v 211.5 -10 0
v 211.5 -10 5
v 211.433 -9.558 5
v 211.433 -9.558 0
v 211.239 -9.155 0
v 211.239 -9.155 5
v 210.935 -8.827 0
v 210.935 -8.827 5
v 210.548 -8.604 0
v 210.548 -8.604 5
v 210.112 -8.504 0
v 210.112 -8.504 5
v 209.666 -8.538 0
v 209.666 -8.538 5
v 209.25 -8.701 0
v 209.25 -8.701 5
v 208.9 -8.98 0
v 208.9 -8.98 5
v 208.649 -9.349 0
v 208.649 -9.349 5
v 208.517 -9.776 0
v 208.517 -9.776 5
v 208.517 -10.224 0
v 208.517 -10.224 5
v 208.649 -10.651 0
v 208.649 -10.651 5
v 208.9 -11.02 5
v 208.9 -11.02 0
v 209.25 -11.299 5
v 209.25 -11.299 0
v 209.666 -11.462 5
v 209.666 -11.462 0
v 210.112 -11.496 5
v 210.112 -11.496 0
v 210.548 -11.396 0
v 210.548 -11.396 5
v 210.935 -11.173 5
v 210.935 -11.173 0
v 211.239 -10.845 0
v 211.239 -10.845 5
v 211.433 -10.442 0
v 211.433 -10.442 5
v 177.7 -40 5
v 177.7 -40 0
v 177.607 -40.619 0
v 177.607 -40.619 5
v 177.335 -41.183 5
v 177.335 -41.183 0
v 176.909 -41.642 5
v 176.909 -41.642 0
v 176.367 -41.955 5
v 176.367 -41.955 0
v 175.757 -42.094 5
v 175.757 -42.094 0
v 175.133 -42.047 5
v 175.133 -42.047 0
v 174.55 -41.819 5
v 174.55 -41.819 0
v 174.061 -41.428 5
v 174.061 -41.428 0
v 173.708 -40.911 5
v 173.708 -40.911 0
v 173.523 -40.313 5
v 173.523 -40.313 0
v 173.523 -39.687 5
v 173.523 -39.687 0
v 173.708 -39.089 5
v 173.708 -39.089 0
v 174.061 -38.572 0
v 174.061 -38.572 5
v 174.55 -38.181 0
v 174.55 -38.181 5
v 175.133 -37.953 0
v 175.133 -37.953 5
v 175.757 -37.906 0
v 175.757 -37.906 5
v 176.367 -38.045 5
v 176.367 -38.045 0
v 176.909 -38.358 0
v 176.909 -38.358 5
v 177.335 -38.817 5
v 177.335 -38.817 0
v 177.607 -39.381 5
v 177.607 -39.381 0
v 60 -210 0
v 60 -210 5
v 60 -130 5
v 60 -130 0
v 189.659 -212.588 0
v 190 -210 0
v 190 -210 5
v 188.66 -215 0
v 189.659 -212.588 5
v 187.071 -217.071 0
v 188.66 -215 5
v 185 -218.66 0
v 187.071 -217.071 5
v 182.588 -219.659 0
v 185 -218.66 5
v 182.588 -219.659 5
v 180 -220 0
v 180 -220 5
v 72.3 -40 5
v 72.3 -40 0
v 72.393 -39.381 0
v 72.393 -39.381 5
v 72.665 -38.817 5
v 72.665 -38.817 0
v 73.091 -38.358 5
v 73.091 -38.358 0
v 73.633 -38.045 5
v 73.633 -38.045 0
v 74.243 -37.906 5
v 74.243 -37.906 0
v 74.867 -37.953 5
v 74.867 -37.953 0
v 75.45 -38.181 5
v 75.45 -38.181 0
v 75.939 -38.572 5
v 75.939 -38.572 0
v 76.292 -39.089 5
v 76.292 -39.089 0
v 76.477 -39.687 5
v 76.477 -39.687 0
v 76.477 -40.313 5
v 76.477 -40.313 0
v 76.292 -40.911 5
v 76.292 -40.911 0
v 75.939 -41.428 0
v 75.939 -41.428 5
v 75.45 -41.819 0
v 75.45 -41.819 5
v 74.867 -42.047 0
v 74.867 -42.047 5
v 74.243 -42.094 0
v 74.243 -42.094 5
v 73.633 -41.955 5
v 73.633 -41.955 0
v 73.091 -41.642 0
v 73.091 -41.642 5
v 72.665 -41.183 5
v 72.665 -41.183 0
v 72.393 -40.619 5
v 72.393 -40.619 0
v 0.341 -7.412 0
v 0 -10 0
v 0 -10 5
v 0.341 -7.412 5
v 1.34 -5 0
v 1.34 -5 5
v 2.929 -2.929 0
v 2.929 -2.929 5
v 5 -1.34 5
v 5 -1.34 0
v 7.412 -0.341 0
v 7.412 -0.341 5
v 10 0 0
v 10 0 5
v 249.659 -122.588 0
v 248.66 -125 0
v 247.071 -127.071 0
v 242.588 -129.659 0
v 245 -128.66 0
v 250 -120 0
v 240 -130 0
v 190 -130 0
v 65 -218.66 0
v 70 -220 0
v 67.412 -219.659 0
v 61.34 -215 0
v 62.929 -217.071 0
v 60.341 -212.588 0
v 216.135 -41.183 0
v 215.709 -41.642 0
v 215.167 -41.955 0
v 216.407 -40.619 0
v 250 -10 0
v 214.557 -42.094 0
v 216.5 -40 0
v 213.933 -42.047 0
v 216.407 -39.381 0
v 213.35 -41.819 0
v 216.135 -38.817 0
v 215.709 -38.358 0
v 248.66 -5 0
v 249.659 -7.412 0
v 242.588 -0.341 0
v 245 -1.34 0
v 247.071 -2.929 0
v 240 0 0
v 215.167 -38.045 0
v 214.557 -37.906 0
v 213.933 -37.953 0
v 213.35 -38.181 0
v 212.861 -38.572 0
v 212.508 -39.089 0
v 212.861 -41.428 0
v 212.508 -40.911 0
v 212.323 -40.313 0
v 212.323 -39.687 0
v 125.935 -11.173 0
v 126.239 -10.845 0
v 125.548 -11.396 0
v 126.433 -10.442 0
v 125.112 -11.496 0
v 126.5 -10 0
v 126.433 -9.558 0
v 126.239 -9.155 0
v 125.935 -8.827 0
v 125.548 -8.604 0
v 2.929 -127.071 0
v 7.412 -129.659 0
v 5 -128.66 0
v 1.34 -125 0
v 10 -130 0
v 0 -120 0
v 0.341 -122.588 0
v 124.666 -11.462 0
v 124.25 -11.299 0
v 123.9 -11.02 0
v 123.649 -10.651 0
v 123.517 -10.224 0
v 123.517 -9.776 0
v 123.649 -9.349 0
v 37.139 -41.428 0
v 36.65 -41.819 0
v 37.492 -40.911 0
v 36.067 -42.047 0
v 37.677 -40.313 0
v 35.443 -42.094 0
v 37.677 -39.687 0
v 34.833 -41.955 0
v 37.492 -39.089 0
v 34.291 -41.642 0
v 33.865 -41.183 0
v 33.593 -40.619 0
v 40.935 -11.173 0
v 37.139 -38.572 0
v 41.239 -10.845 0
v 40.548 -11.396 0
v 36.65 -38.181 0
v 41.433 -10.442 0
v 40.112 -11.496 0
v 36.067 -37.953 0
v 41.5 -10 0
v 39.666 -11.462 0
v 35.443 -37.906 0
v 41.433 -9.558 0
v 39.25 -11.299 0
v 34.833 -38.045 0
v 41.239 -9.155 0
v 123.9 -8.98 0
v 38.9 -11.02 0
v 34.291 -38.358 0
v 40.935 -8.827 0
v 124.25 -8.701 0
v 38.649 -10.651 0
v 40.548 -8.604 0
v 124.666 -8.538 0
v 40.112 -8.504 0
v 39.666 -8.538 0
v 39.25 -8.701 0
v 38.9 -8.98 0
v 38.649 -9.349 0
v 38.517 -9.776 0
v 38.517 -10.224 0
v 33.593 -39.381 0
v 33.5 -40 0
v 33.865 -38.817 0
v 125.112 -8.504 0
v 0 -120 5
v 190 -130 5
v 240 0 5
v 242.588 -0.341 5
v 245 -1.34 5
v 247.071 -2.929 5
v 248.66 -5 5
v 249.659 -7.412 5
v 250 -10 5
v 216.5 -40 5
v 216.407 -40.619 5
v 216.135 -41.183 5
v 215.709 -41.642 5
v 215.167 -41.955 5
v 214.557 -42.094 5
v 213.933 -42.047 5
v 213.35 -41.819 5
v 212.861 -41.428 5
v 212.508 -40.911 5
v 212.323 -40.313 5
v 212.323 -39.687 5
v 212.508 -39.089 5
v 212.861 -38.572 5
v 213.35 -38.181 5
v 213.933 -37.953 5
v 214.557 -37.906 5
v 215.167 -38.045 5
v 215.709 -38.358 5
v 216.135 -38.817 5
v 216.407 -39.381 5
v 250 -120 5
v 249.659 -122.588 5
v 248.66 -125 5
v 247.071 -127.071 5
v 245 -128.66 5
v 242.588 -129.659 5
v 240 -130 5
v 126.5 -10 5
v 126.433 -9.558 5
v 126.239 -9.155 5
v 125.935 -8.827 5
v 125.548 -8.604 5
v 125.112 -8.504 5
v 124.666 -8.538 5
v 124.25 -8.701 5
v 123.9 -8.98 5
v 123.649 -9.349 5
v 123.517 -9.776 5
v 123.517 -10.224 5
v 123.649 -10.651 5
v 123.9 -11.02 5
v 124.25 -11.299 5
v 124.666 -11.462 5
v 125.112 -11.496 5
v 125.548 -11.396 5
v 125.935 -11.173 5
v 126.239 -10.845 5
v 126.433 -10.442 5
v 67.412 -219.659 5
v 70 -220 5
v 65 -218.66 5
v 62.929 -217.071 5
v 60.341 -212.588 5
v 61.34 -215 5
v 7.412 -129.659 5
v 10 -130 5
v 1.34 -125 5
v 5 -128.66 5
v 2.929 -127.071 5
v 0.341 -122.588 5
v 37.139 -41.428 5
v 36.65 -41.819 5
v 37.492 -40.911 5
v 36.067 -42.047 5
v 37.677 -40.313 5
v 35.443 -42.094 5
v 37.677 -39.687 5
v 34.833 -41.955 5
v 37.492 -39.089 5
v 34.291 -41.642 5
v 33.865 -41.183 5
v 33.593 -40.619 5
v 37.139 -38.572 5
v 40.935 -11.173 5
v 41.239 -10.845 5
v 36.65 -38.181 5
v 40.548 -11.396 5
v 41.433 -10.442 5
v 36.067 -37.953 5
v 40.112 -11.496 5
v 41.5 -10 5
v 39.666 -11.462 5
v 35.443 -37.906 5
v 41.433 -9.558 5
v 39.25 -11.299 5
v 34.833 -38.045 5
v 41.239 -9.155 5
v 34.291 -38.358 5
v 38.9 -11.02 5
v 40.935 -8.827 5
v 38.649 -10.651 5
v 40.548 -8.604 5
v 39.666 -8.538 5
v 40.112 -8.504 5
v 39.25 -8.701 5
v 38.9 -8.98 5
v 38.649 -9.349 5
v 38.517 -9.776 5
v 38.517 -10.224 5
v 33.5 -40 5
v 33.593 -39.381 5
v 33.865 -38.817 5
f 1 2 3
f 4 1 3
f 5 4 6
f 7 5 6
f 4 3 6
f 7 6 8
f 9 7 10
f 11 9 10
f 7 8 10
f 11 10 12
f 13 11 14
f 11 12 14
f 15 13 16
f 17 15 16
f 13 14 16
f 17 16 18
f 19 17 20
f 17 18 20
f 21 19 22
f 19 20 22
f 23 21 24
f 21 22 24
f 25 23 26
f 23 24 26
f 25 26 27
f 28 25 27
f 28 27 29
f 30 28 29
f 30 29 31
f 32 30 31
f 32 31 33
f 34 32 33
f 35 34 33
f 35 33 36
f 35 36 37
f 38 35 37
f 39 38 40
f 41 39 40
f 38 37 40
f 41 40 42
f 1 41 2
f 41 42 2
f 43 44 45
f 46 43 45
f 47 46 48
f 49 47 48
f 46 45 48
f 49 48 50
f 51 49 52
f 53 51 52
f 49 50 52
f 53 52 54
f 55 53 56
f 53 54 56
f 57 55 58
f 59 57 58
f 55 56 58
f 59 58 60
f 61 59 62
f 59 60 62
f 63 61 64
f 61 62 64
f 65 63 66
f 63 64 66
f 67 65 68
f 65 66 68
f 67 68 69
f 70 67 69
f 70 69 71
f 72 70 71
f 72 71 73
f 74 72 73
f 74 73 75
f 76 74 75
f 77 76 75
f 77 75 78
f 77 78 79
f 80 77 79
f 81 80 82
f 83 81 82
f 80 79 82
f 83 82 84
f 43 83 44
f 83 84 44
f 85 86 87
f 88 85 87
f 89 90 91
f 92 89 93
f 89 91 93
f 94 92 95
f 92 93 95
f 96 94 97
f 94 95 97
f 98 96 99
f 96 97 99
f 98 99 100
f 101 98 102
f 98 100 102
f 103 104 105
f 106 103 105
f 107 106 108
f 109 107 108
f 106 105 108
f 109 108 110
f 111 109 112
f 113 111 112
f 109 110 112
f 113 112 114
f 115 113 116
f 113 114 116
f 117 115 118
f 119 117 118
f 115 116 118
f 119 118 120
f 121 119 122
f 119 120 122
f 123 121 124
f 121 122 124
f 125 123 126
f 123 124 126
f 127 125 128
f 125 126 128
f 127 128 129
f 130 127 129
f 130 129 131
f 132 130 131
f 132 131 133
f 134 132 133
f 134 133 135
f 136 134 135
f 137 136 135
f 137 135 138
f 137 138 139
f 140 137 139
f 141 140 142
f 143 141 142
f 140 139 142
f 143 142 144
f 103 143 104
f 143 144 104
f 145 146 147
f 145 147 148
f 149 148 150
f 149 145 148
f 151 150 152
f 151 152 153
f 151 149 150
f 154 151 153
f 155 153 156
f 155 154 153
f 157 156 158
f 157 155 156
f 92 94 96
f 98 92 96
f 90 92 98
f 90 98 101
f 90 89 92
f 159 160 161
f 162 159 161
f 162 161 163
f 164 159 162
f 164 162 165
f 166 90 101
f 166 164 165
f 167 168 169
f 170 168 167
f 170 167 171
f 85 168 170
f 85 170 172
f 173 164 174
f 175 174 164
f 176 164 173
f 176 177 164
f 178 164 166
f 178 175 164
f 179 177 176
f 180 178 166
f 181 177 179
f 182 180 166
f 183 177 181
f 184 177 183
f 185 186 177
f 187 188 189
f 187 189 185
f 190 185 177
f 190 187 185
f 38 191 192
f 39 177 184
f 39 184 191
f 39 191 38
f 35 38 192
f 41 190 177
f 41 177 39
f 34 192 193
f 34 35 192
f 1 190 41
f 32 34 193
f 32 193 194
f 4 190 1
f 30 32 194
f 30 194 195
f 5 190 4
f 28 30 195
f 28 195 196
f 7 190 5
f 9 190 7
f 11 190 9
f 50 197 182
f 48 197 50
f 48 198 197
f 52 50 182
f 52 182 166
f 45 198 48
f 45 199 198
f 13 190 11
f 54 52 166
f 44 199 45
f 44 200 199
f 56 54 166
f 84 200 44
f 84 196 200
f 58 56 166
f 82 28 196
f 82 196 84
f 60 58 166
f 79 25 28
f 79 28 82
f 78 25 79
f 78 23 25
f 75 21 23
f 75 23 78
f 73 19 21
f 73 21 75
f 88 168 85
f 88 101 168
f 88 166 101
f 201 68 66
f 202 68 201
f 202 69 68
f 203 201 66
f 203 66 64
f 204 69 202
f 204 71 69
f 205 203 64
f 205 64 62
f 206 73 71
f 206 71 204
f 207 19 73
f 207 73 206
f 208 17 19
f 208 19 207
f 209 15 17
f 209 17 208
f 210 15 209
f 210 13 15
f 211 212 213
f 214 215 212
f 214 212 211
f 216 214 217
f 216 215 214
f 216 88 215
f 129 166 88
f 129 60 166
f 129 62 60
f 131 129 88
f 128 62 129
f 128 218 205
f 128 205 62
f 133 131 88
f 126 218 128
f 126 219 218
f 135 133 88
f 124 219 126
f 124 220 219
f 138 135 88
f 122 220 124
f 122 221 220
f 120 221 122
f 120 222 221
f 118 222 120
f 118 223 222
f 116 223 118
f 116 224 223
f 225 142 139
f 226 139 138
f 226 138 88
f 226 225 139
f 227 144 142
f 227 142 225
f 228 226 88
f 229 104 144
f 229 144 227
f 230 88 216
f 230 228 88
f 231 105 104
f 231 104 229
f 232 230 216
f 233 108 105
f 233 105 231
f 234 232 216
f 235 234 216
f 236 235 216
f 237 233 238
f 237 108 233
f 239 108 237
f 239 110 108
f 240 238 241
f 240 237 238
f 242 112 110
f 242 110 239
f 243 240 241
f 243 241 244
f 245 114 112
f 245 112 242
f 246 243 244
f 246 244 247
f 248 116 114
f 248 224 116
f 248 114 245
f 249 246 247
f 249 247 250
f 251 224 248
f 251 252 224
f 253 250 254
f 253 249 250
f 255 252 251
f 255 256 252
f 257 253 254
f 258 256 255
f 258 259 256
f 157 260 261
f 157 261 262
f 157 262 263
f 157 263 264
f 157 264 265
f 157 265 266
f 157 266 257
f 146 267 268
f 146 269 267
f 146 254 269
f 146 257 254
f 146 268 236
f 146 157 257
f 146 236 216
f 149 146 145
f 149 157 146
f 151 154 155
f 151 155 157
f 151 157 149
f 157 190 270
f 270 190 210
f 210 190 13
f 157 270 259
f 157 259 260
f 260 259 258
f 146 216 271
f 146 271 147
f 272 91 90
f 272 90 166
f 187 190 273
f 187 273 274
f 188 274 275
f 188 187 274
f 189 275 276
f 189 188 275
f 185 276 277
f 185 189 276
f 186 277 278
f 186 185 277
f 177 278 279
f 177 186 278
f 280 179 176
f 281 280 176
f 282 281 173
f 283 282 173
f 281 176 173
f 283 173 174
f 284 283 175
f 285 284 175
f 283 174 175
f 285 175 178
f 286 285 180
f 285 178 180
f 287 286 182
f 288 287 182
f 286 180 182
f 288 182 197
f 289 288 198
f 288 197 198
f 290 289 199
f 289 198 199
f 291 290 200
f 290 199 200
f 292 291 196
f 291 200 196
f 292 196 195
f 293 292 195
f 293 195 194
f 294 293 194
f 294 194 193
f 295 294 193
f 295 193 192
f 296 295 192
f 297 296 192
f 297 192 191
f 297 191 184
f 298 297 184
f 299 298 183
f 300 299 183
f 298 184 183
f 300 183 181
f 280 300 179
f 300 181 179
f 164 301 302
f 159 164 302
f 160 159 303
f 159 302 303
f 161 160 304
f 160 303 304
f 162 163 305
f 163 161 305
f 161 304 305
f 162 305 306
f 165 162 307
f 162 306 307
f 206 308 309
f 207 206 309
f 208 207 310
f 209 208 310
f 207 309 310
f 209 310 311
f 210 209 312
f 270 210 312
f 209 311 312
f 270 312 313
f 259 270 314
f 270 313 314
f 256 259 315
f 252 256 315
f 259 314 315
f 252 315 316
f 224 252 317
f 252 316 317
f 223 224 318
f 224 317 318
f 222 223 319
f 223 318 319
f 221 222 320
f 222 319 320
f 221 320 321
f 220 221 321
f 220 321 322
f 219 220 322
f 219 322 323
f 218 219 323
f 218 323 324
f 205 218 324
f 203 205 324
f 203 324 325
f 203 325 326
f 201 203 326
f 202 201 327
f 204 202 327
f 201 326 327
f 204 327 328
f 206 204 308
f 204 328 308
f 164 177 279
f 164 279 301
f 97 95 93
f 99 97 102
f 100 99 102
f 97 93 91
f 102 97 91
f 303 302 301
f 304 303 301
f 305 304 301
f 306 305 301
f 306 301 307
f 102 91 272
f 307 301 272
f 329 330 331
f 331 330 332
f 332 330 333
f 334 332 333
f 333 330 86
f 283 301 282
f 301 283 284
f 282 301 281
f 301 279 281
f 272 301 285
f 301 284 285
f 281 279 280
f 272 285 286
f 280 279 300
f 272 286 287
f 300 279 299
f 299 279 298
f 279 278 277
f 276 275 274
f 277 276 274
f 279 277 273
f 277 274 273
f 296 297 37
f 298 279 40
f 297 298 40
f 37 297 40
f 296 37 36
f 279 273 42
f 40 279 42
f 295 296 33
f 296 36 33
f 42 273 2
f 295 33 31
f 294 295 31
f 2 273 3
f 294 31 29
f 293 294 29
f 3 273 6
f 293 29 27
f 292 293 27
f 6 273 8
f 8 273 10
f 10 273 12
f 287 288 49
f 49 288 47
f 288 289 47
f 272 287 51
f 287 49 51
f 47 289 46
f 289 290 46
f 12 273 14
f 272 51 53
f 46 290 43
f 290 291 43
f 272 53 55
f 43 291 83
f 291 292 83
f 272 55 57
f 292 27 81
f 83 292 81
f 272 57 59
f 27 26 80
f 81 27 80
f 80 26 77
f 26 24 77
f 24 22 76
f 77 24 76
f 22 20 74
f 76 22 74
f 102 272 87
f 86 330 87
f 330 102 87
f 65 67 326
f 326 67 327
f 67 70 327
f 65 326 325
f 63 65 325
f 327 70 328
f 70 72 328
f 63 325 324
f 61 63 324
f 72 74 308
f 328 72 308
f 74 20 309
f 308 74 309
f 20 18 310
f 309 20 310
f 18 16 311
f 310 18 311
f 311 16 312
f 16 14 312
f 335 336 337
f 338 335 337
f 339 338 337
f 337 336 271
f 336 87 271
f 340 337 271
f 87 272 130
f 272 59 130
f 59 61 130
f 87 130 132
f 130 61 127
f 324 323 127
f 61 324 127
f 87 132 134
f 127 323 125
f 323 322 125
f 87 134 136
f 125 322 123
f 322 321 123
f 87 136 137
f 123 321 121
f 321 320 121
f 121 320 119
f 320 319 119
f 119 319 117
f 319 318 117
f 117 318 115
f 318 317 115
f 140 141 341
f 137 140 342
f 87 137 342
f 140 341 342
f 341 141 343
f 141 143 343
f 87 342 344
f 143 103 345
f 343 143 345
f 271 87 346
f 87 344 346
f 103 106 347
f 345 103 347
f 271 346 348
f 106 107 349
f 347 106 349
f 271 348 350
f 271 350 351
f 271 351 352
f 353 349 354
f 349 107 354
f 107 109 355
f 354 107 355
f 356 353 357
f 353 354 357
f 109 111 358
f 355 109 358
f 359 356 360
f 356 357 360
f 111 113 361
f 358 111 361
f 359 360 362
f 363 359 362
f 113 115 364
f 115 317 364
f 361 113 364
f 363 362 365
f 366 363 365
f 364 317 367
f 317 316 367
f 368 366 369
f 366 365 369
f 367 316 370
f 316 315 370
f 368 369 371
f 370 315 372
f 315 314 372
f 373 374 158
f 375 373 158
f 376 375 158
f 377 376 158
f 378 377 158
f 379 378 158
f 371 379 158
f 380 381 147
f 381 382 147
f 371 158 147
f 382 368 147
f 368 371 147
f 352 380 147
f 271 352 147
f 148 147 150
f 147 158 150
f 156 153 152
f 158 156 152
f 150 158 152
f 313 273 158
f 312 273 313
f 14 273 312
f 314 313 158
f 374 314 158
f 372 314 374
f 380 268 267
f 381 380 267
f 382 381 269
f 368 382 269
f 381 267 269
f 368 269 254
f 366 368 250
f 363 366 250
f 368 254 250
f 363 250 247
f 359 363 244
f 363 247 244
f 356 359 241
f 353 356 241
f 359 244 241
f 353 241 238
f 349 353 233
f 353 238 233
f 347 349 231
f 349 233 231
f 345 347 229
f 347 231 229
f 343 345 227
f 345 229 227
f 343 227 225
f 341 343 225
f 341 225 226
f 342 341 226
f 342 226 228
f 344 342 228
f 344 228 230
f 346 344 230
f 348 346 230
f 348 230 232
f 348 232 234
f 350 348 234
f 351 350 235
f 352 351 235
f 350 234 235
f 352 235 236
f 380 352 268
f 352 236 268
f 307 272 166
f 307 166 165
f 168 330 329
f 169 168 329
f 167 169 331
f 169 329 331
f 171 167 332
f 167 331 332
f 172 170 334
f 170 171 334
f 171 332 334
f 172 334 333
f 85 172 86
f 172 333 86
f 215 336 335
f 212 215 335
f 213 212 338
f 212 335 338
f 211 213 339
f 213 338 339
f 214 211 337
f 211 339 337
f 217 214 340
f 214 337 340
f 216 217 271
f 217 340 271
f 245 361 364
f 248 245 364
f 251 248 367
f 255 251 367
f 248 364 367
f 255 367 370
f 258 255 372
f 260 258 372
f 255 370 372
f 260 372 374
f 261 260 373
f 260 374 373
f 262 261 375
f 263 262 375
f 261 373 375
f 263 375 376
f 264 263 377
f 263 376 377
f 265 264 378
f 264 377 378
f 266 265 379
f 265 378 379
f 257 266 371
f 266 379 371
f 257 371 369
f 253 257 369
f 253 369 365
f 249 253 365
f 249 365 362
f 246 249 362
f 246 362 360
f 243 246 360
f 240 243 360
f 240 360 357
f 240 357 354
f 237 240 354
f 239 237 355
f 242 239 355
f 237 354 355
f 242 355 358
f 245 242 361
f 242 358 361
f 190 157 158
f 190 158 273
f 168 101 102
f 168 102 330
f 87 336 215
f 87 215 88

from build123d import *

# Parameters (mm, degrees)
EXTRUDE_1_DEPTH      = 5
SKETCH_9_R           = 1.5
CUT_EXTRUDE_7_DEPTH  = 5
SKETCH_7_R           = 2.1
CUT_EXTRUDE_8_DEPTH  = 5
CUT_EXTRUDE_9_REACH  = 335.054
SKETCH_10_W          = 60
SKETCH_10_H          = 90
CUT_EXTRUDE_11_REACH = 335.054


with BuildPart() as part:
    # 草图1 → 凸台-拉伸1 (new body)
    with BuildSketch(Plane.XY):
        with BuildLine():
            Line((10, 0), (240, 0))
            ThreePointArc((240, 0), (247.071067812, -2.928932188), (250, -10))
            Line((250, -10), (250, -210))
            ThreePointArc((250, -210), (247.071067812, -217.071067812), (240, -220))
            Line((240, -220), (10, -220))
            ThreePointArc((10, -220), (2.928932188, -217.071067812), (0, -210))
            Line((0, -210), (0, -10))
            ThreePointArc((0, -10), (2.928932188, -2.928932188), (10, 0))
        make_face()
    extrude(amount=EXTRUDE_1_DEPTH)

    # 草图9 → 切除-拉伸7 (cut)
    with BuildSketch(Plane.XY.offset(5)):
        with Locations((40, -10)):
            Circle(SKETCH_9_R)
        with Locations((125, -10)):
            Circle(SKETCH_9_R)
        with Locations((210, -10)):
            Circle(SKETCH_9_R)
    extrude(amount=-CUT_EXTRUDE_7_DEPTH, mode=Mode.SUBTRACT)

    # 草图7 → 切除-拉伸8 (cut)
    with BuildSketch(Plane(origin=(0, 0, 0), x_dir=(-1, 0, 0), z_dir=(0, 0, -1))):
        with Locations((-74.4, -40)):
            Circle(SKETCH_7_R)
        with Locations((-35.6, -40)):
            Circle(SKETCH_7_R)
        with Locations(Location((-214.4, -40, 0), (0, 0, 180))):
            Circle(SKETCH_7_R)
        with Locations(Location((-175.6, -40, 0), (0, 0, 180))):
            Circle(SKETCH_7_R)
    extrude(amount=-CUT_EXTRUDE_8_DEPTH, mode=Mode.SUBTRACT)

    # 草图10 → 切除-拉伸9 (cut, up to next)
    with BuildSketch(Plane.XY.offset(5), mode=Mode.PRIVATE) as cut_extrude_9_sk1:
        with Locations((220, -175)):
            Rectangle(SKETCH_10_W, SKETCH_10_H)
    cut_extrude_9_tool1 = extrude(cut_extrude_9_sk1.sketch, amount=-CUT_EXTRUDE_9_REACH, mode=Mode.PRIVATE) & part.part
    # 草图10 → 切除-拉伸9 (cut, up to next)
    with BuildSketch(Plane.XY.offset(5), mode=Mode.PRIVATE) as cut_extrude_9_sk2:
        with Locations((30, -175)):
            Rectangle(SKETCH_10_W, SKETCH_10_H)
    cut_extrude_9_tool2 = extrude(cut_extrude_9_sk2.sketch, amount=-CUT_EXTRUDE_9_REACH, mode=Mode.PRIVATE) & part.part
    add(cut_extrude_9_tool1.solids().sort_by_distance((220, -175, 5))[0], mode=Mode.SUBTRACT)
    add(cut_extrude_9_tool2.solids().sort_by_distance((30, -175, 5))[0], mode=Mode.SUBTRACT)

    # 草图11 → 切除-拉伸11 (cut, up to next)
    with BuildSketch(Plane.XY.offset(5), mode=Mode.PRIVATE) as cut_extrude_11_sk1:
        with BuildLine():
            Line((0, -130), (10, -130))
            ThreePointArc((10, -130), (2.928932188, -127.071067812), (0, -120))
            Line((0, -120), (0, -130))
        make_face()
    cut_extrude_11_tool1 = extrude(cut_extrude_11_sk1.sketch, amount=-CUT_EXTRUDE_11_REACH, mode=Mode.PRIVATE) & part.part
    # 草图11 → 切除-拉伸11 (cut, up to next)
    with BuildSketch(Plane.XY.offset(5), mode=Mode.PRIVATE) as cut_extrude_11_sk2:
        with BuildLine():
            ThreePointArc((70, -220), (62.928932188, -217.071067812), (60, -210))
            Line((60, -210), (60, -220))
            Line((60, -220), (70, -220))
        make_face()
    cut_extrude_11_tool2 = extrude(cut_extrude_11_sk2.sketch, amount=-CUT_EXTRUDE_11_REACH, mode=Mode.PRIVATE) & part.part
    # 草图11 → 切除-拉伸11 (cut, up to next)
    with BuildSketch(Plane.XY.offset(5), mode=Mode.PRIVATE) as cut_extrude_11_sk3:
        with BuildLine():
            ThreePointArc((190, -210), (187.071067812, -217.071067812), (180, -220))
            Line((180, -220), (190, -220))
            Line((190, -220), (190, -210))
        make_face()
    cut_extrude_11_tool3 = extrude(cut_extrude_11_sk3.sketch, amount=-CUT_EXTRUDE_11_REACH, mode=Mode.PRIVATE) & part.part
    # 草图11 → 切除-拉伸11 (cut, up to next)
    with BuildSketch(Plane.XY.offset(5), mode=Mode.PRIVATE) as cut_extrude_11_sk4:
        with BuildLine():
            ThreePointArc((250, -120), (247.071067812, -127.071067812), (240, -130))
            Line((240, -130), (250, -130))
            Line((250, -130), (250, -120))
        make_face()
    cut_extrude_11_tool4 = extrude(cut_extrude_11_sk4.sketch, amount=-CUT_EXTRUDE_11_REACH, mode=Mode.PRIVATE) & part.part
    add(cut_extrude_11_tool1.solids().sort_by_distance((2.233679, -127.766321, 5))[0], mode=Mode.SUBTRACT)
    add(cut_extrude_11_tool2.solids().sort_by_distance((62.233679, -217.766321, 5))[0], mode=Mode.SUBTRACT)
    add(cut_extrude_11_tool3.solids().sort_by_distance((187.766321, -217.766321, 5))[0], mode=Mode.SUBTRACT)
    add(cut_extrude_11_tool4.solids().sort_by_distance((247.766321, -127.766321, 5))[0], mode=Mode.SUBTRACT)


solid = part.part
